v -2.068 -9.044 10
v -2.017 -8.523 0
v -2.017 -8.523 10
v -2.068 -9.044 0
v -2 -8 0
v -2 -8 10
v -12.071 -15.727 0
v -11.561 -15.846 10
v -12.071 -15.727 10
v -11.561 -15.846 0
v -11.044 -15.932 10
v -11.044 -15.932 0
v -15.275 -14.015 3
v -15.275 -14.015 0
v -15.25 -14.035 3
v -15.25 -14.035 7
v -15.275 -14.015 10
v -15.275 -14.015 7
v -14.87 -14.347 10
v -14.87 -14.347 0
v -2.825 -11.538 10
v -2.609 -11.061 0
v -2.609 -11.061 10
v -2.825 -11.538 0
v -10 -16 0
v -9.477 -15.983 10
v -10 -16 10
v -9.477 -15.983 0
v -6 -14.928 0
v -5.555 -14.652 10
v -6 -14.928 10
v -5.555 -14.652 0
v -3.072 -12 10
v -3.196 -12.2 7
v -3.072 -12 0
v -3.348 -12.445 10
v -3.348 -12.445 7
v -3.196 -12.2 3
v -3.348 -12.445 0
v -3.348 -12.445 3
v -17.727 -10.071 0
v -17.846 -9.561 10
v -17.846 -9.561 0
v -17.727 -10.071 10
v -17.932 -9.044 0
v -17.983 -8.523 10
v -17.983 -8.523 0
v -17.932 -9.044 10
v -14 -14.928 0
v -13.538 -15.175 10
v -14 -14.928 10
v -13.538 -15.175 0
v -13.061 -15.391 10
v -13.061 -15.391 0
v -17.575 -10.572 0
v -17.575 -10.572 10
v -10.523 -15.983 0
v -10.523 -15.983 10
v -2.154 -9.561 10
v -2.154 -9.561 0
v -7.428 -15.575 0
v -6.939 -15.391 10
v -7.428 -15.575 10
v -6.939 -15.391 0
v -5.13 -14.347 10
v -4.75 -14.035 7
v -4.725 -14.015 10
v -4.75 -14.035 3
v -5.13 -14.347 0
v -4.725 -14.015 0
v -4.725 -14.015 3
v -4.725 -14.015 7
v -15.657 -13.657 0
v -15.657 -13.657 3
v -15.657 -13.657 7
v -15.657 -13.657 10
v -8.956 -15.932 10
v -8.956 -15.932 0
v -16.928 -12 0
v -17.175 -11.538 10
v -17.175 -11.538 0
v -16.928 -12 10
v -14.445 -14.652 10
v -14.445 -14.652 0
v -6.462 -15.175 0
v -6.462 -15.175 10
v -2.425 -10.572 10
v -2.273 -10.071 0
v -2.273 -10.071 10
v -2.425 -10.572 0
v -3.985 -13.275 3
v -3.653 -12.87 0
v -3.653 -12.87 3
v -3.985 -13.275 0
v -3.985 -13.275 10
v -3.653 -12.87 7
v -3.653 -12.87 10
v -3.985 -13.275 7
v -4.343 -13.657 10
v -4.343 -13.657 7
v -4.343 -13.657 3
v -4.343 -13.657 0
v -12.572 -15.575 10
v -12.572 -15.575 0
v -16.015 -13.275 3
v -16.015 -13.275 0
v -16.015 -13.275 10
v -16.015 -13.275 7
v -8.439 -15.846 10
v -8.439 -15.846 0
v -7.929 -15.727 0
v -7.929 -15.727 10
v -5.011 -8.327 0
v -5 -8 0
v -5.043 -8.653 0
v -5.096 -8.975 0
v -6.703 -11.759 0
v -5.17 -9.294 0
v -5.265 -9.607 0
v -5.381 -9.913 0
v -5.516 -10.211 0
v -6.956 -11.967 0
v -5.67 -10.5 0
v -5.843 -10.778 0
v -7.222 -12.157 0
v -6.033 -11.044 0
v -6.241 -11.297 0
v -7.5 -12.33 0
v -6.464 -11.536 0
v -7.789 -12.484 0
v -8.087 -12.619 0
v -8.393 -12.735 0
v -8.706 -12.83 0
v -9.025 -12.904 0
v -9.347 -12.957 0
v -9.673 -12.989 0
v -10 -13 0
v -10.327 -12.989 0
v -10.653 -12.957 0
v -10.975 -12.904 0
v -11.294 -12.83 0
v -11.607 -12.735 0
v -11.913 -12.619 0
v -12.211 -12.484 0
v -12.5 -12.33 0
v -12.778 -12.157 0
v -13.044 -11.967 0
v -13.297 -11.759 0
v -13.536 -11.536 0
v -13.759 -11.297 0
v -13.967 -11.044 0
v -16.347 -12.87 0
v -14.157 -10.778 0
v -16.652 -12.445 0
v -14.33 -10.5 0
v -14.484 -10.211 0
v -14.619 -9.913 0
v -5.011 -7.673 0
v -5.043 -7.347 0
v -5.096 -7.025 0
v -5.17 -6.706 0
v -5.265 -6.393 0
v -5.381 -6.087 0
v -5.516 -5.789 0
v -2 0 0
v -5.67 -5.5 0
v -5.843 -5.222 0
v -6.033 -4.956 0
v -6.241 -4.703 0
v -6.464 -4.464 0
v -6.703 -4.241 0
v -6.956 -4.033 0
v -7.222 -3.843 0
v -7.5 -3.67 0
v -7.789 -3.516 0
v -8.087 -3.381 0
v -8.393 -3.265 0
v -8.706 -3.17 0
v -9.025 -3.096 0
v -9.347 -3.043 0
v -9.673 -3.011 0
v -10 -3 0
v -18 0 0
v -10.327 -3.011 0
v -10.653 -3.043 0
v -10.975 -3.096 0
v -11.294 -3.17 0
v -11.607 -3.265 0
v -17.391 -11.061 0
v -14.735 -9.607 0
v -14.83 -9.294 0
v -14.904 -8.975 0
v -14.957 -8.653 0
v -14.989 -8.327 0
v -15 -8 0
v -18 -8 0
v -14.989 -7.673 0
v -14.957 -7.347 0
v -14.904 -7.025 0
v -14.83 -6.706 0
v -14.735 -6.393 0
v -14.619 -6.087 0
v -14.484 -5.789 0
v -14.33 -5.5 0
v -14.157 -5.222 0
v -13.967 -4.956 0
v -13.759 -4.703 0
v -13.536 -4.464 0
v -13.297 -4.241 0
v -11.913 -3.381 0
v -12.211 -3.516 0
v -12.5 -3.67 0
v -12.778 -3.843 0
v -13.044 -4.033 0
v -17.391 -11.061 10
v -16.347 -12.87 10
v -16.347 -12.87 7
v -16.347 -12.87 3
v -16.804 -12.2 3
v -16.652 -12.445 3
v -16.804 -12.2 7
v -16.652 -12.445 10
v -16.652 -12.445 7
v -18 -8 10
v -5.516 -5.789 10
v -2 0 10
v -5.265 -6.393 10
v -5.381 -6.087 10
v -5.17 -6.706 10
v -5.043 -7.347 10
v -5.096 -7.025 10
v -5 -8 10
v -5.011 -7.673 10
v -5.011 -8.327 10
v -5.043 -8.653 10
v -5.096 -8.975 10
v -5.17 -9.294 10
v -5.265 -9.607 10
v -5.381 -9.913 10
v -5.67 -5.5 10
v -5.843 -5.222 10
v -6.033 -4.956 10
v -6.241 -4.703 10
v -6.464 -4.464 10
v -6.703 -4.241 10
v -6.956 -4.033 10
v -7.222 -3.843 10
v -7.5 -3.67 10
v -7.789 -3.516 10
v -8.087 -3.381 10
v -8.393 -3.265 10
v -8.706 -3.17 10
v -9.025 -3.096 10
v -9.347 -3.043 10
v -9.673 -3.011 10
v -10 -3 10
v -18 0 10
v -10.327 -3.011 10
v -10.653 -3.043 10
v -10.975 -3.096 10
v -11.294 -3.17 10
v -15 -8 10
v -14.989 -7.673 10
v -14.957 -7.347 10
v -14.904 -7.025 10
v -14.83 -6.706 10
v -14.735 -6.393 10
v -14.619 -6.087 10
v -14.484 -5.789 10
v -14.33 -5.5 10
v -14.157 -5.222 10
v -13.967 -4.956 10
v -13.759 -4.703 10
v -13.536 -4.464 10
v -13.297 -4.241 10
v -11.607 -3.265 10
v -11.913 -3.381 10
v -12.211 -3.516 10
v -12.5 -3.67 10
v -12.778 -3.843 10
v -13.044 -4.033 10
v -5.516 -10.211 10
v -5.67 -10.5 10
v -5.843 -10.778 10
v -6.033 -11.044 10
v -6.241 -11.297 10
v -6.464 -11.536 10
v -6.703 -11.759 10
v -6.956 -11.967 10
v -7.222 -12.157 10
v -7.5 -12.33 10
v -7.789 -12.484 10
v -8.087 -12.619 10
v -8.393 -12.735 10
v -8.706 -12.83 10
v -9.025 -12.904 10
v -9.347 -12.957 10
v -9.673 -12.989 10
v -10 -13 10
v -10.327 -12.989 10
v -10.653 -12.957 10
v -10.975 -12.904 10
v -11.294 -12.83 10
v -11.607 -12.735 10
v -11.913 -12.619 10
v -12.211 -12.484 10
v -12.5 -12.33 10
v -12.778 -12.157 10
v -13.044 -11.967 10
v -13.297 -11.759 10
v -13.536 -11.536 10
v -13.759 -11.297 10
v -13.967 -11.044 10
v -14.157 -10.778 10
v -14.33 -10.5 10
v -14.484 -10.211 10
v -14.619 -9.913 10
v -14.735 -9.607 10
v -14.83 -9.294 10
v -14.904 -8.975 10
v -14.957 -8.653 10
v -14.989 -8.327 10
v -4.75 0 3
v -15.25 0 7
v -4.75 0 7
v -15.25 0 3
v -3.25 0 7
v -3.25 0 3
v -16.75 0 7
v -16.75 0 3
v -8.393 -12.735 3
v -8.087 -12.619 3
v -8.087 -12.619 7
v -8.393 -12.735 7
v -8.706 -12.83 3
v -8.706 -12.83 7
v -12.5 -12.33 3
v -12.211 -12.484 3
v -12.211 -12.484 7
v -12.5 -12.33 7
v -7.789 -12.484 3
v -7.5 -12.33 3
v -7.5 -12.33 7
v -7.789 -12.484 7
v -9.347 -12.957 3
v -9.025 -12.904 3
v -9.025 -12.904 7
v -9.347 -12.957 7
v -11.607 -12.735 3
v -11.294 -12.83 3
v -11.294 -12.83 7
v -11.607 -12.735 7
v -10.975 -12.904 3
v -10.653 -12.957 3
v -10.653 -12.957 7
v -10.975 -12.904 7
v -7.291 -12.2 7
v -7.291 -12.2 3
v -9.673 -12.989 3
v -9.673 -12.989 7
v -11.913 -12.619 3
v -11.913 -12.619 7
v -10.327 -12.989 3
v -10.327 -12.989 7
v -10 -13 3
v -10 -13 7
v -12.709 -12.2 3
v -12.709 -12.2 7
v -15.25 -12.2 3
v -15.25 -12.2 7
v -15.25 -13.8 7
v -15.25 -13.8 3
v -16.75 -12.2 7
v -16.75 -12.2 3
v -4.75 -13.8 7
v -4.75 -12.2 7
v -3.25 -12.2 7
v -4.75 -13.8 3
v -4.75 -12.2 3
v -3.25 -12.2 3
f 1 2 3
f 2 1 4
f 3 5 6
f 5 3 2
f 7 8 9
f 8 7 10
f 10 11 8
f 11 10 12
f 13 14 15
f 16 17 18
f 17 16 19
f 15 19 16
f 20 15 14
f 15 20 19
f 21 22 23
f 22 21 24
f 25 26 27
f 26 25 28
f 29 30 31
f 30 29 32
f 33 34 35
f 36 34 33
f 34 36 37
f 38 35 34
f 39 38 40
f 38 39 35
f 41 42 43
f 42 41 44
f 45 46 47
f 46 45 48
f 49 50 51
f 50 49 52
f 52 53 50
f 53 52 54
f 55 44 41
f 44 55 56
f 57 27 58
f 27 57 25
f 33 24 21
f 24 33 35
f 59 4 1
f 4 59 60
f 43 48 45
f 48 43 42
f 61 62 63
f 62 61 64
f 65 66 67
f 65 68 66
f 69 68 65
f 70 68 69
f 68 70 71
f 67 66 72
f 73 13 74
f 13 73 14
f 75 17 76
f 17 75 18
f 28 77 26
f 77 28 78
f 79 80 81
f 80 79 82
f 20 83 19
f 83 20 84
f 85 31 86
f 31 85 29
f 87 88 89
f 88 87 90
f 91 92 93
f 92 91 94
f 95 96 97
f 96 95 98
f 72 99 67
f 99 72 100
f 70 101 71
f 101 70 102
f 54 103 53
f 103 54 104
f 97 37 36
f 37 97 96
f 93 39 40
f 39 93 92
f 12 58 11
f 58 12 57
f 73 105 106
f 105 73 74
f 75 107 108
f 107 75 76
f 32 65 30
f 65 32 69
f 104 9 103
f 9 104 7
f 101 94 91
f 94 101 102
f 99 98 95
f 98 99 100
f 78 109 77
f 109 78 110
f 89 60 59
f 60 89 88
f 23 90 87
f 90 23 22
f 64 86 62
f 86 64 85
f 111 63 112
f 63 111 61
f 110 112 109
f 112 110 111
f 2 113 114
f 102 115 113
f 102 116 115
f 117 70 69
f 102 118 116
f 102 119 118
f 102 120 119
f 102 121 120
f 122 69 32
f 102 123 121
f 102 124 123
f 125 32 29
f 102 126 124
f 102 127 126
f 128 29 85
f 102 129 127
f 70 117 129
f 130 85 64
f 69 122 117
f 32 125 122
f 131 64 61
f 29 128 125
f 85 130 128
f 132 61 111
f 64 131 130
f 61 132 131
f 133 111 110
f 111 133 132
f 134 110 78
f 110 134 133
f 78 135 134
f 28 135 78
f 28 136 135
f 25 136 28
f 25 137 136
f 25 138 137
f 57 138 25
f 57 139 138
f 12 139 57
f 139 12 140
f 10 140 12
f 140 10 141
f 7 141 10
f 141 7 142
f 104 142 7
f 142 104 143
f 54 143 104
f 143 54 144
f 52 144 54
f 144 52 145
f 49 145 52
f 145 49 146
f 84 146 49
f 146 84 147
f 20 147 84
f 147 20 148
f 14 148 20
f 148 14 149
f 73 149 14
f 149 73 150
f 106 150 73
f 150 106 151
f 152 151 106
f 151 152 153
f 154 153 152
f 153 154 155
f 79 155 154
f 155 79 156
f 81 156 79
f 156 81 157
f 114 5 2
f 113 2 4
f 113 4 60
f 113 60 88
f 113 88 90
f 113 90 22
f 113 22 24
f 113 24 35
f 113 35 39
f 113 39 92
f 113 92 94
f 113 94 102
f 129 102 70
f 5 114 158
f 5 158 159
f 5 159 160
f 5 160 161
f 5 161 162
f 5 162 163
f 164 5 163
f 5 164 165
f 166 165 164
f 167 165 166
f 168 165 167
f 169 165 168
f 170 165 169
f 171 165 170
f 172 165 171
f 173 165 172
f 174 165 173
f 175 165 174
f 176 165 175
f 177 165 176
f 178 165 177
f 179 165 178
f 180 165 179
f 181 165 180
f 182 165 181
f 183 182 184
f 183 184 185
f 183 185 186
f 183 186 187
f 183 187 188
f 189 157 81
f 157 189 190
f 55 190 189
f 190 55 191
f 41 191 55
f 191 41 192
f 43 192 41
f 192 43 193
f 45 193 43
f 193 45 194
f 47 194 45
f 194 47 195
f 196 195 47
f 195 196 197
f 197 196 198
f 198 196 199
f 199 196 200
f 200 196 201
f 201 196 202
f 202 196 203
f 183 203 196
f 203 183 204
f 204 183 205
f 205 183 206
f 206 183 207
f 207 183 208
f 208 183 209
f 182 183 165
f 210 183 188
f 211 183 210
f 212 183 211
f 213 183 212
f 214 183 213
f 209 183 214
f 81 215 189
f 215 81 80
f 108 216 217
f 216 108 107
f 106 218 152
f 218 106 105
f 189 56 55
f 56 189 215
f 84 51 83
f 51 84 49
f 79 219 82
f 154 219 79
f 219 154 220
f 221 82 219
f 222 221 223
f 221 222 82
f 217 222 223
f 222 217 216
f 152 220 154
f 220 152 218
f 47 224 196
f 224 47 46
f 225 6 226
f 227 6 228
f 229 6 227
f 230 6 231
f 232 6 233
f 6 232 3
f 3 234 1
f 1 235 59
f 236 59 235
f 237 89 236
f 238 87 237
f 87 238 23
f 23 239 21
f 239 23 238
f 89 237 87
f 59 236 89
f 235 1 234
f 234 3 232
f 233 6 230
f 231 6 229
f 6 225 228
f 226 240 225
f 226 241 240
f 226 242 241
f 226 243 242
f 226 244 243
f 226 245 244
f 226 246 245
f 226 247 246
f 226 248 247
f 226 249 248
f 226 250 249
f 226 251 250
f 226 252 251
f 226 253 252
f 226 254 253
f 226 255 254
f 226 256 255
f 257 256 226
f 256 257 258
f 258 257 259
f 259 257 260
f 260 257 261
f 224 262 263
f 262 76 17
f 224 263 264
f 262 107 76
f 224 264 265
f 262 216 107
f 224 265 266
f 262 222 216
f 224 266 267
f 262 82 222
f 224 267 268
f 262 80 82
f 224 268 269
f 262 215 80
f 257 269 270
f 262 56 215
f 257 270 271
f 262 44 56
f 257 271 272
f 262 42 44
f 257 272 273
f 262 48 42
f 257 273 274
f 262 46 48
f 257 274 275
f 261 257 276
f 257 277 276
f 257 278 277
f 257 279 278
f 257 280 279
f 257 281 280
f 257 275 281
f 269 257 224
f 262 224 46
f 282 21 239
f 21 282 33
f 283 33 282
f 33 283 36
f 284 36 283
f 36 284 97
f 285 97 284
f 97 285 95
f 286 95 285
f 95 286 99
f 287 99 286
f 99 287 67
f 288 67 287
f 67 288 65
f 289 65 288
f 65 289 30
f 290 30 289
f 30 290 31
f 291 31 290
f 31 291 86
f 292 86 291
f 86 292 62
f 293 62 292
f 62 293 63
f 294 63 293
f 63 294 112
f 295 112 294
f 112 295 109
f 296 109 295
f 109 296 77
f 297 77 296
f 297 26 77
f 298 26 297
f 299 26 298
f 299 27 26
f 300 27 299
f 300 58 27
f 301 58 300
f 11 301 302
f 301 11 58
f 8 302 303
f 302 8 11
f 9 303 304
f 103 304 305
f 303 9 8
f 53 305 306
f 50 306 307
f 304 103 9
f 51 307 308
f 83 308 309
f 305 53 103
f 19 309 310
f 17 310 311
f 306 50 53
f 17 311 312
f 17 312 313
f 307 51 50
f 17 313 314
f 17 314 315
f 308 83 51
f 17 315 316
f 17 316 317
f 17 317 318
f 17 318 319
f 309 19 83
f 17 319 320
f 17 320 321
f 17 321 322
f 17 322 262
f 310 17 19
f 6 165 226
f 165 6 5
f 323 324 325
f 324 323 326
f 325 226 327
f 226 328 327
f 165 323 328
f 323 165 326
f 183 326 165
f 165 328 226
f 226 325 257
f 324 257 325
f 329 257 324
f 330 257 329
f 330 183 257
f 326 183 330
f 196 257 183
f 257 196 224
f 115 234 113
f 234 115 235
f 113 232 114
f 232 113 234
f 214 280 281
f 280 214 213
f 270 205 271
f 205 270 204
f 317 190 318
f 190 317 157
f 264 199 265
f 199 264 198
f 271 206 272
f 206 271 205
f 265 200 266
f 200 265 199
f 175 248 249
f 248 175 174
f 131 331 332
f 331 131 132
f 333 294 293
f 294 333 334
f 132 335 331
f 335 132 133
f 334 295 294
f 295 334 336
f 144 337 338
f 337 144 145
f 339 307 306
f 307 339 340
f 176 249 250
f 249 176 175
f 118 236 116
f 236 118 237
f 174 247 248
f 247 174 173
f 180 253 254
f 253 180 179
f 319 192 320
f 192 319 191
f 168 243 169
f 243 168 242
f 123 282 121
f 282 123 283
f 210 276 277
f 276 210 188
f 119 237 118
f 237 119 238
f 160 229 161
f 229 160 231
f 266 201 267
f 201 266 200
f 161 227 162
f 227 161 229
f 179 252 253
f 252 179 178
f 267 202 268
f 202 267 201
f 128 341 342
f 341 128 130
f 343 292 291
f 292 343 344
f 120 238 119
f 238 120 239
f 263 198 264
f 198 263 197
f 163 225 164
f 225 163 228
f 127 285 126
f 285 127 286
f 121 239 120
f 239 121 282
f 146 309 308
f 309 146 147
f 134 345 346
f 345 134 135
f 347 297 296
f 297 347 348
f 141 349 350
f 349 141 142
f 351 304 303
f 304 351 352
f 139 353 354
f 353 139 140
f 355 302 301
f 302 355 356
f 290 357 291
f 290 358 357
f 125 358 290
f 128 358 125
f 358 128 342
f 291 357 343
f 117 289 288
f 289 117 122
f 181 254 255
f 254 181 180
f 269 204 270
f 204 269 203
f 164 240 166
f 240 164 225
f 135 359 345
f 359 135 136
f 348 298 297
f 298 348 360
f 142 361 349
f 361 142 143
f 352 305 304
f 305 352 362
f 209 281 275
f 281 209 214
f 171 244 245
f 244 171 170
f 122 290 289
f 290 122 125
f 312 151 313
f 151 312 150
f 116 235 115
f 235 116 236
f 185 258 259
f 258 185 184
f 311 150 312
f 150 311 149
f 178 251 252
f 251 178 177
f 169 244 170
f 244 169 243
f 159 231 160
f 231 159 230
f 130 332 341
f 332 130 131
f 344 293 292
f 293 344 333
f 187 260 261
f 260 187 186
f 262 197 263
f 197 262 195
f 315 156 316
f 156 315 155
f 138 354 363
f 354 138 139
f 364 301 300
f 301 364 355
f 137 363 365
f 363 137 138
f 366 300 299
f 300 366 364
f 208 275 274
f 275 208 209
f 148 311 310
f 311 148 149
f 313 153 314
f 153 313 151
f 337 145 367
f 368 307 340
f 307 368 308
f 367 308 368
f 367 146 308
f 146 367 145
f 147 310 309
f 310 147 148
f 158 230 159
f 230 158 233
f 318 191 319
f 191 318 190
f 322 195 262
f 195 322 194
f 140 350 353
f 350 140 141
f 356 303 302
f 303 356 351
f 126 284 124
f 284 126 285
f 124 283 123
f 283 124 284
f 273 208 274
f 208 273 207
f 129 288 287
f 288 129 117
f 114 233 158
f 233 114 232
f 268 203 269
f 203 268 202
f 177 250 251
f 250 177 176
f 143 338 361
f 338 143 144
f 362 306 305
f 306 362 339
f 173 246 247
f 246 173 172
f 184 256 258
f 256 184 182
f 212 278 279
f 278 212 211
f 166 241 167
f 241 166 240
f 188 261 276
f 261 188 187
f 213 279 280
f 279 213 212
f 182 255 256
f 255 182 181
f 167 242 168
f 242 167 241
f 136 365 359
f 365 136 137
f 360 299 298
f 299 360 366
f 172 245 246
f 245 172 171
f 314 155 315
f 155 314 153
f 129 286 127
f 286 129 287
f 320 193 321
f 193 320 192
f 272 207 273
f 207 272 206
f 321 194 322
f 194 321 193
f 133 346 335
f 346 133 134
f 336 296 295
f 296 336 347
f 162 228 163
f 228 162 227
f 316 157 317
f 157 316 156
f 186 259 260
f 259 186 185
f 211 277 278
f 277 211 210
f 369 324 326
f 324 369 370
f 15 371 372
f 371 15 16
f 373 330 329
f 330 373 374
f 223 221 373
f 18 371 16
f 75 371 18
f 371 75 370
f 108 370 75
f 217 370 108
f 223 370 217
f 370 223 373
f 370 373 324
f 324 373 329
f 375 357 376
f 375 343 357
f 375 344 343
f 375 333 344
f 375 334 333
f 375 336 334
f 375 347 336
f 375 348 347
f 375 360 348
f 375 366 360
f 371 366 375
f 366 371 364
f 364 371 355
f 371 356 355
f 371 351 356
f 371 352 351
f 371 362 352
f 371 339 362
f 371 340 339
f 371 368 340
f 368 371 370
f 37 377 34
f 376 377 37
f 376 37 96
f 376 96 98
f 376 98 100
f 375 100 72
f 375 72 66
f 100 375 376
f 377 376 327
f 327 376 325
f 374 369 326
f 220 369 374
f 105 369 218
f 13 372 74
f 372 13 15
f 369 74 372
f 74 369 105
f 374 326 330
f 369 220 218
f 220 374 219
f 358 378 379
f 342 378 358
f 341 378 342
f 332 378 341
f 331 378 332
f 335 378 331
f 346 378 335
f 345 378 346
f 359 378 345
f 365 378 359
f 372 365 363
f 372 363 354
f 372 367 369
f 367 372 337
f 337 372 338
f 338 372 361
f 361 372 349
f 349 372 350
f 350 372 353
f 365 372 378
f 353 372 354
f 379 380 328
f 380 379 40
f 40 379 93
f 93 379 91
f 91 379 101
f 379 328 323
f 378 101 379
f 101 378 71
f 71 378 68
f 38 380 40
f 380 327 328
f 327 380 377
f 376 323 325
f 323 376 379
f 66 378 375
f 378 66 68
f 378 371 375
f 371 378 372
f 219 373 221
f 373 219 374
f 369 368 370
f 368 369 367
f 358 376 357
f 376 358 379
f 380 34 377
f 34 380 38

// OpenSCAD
// 8mm SFBS0810 slide bushing holder for y carriage
// carriage mounting holes M4, 15mm apart
$fn=96;
nothing=.001;

module main() {
    difference() {
        union() {
            //translate([0, 0, 0]) cube(size=[25, 25, 3], center=true);
            translate([0, 0, 8]) rotate([90, 0, 0]) cylinder(r=12/2+2, h=10, center=true);
            translate([0, 0, 4]) cube(size=[16, 10, 8], center=true);

        }
        translate([0, 0, 8]) rotate([90, 0, 0]) cylinder(r=10/2, h=15, center=true);
        translate([-15/2+1.5, 0, 0]) cube(size=[1.5, 4, 40], center=true);
        translate([15/2-1.5, 0, 0]) cube(size=[1.5, 4, 40], center=true);
        translate([0, 0, 13]) cube(size=[30, 4, 1.6], center=true);
    }    
}

// translate([15, 0, 1.5-nothing]) 
// difference() {
//     main();
//     translate([0, 0, 21]) cube(size=[40, 40, 40], center=true);
// }

translate([-10, 0, 5])
rotate([90, 0, 0]) 
//difference() {
     main();
    //translate([0, 0, -18.5+nothing]) cube(size=[40, 40, 40], center=true);
//} 
